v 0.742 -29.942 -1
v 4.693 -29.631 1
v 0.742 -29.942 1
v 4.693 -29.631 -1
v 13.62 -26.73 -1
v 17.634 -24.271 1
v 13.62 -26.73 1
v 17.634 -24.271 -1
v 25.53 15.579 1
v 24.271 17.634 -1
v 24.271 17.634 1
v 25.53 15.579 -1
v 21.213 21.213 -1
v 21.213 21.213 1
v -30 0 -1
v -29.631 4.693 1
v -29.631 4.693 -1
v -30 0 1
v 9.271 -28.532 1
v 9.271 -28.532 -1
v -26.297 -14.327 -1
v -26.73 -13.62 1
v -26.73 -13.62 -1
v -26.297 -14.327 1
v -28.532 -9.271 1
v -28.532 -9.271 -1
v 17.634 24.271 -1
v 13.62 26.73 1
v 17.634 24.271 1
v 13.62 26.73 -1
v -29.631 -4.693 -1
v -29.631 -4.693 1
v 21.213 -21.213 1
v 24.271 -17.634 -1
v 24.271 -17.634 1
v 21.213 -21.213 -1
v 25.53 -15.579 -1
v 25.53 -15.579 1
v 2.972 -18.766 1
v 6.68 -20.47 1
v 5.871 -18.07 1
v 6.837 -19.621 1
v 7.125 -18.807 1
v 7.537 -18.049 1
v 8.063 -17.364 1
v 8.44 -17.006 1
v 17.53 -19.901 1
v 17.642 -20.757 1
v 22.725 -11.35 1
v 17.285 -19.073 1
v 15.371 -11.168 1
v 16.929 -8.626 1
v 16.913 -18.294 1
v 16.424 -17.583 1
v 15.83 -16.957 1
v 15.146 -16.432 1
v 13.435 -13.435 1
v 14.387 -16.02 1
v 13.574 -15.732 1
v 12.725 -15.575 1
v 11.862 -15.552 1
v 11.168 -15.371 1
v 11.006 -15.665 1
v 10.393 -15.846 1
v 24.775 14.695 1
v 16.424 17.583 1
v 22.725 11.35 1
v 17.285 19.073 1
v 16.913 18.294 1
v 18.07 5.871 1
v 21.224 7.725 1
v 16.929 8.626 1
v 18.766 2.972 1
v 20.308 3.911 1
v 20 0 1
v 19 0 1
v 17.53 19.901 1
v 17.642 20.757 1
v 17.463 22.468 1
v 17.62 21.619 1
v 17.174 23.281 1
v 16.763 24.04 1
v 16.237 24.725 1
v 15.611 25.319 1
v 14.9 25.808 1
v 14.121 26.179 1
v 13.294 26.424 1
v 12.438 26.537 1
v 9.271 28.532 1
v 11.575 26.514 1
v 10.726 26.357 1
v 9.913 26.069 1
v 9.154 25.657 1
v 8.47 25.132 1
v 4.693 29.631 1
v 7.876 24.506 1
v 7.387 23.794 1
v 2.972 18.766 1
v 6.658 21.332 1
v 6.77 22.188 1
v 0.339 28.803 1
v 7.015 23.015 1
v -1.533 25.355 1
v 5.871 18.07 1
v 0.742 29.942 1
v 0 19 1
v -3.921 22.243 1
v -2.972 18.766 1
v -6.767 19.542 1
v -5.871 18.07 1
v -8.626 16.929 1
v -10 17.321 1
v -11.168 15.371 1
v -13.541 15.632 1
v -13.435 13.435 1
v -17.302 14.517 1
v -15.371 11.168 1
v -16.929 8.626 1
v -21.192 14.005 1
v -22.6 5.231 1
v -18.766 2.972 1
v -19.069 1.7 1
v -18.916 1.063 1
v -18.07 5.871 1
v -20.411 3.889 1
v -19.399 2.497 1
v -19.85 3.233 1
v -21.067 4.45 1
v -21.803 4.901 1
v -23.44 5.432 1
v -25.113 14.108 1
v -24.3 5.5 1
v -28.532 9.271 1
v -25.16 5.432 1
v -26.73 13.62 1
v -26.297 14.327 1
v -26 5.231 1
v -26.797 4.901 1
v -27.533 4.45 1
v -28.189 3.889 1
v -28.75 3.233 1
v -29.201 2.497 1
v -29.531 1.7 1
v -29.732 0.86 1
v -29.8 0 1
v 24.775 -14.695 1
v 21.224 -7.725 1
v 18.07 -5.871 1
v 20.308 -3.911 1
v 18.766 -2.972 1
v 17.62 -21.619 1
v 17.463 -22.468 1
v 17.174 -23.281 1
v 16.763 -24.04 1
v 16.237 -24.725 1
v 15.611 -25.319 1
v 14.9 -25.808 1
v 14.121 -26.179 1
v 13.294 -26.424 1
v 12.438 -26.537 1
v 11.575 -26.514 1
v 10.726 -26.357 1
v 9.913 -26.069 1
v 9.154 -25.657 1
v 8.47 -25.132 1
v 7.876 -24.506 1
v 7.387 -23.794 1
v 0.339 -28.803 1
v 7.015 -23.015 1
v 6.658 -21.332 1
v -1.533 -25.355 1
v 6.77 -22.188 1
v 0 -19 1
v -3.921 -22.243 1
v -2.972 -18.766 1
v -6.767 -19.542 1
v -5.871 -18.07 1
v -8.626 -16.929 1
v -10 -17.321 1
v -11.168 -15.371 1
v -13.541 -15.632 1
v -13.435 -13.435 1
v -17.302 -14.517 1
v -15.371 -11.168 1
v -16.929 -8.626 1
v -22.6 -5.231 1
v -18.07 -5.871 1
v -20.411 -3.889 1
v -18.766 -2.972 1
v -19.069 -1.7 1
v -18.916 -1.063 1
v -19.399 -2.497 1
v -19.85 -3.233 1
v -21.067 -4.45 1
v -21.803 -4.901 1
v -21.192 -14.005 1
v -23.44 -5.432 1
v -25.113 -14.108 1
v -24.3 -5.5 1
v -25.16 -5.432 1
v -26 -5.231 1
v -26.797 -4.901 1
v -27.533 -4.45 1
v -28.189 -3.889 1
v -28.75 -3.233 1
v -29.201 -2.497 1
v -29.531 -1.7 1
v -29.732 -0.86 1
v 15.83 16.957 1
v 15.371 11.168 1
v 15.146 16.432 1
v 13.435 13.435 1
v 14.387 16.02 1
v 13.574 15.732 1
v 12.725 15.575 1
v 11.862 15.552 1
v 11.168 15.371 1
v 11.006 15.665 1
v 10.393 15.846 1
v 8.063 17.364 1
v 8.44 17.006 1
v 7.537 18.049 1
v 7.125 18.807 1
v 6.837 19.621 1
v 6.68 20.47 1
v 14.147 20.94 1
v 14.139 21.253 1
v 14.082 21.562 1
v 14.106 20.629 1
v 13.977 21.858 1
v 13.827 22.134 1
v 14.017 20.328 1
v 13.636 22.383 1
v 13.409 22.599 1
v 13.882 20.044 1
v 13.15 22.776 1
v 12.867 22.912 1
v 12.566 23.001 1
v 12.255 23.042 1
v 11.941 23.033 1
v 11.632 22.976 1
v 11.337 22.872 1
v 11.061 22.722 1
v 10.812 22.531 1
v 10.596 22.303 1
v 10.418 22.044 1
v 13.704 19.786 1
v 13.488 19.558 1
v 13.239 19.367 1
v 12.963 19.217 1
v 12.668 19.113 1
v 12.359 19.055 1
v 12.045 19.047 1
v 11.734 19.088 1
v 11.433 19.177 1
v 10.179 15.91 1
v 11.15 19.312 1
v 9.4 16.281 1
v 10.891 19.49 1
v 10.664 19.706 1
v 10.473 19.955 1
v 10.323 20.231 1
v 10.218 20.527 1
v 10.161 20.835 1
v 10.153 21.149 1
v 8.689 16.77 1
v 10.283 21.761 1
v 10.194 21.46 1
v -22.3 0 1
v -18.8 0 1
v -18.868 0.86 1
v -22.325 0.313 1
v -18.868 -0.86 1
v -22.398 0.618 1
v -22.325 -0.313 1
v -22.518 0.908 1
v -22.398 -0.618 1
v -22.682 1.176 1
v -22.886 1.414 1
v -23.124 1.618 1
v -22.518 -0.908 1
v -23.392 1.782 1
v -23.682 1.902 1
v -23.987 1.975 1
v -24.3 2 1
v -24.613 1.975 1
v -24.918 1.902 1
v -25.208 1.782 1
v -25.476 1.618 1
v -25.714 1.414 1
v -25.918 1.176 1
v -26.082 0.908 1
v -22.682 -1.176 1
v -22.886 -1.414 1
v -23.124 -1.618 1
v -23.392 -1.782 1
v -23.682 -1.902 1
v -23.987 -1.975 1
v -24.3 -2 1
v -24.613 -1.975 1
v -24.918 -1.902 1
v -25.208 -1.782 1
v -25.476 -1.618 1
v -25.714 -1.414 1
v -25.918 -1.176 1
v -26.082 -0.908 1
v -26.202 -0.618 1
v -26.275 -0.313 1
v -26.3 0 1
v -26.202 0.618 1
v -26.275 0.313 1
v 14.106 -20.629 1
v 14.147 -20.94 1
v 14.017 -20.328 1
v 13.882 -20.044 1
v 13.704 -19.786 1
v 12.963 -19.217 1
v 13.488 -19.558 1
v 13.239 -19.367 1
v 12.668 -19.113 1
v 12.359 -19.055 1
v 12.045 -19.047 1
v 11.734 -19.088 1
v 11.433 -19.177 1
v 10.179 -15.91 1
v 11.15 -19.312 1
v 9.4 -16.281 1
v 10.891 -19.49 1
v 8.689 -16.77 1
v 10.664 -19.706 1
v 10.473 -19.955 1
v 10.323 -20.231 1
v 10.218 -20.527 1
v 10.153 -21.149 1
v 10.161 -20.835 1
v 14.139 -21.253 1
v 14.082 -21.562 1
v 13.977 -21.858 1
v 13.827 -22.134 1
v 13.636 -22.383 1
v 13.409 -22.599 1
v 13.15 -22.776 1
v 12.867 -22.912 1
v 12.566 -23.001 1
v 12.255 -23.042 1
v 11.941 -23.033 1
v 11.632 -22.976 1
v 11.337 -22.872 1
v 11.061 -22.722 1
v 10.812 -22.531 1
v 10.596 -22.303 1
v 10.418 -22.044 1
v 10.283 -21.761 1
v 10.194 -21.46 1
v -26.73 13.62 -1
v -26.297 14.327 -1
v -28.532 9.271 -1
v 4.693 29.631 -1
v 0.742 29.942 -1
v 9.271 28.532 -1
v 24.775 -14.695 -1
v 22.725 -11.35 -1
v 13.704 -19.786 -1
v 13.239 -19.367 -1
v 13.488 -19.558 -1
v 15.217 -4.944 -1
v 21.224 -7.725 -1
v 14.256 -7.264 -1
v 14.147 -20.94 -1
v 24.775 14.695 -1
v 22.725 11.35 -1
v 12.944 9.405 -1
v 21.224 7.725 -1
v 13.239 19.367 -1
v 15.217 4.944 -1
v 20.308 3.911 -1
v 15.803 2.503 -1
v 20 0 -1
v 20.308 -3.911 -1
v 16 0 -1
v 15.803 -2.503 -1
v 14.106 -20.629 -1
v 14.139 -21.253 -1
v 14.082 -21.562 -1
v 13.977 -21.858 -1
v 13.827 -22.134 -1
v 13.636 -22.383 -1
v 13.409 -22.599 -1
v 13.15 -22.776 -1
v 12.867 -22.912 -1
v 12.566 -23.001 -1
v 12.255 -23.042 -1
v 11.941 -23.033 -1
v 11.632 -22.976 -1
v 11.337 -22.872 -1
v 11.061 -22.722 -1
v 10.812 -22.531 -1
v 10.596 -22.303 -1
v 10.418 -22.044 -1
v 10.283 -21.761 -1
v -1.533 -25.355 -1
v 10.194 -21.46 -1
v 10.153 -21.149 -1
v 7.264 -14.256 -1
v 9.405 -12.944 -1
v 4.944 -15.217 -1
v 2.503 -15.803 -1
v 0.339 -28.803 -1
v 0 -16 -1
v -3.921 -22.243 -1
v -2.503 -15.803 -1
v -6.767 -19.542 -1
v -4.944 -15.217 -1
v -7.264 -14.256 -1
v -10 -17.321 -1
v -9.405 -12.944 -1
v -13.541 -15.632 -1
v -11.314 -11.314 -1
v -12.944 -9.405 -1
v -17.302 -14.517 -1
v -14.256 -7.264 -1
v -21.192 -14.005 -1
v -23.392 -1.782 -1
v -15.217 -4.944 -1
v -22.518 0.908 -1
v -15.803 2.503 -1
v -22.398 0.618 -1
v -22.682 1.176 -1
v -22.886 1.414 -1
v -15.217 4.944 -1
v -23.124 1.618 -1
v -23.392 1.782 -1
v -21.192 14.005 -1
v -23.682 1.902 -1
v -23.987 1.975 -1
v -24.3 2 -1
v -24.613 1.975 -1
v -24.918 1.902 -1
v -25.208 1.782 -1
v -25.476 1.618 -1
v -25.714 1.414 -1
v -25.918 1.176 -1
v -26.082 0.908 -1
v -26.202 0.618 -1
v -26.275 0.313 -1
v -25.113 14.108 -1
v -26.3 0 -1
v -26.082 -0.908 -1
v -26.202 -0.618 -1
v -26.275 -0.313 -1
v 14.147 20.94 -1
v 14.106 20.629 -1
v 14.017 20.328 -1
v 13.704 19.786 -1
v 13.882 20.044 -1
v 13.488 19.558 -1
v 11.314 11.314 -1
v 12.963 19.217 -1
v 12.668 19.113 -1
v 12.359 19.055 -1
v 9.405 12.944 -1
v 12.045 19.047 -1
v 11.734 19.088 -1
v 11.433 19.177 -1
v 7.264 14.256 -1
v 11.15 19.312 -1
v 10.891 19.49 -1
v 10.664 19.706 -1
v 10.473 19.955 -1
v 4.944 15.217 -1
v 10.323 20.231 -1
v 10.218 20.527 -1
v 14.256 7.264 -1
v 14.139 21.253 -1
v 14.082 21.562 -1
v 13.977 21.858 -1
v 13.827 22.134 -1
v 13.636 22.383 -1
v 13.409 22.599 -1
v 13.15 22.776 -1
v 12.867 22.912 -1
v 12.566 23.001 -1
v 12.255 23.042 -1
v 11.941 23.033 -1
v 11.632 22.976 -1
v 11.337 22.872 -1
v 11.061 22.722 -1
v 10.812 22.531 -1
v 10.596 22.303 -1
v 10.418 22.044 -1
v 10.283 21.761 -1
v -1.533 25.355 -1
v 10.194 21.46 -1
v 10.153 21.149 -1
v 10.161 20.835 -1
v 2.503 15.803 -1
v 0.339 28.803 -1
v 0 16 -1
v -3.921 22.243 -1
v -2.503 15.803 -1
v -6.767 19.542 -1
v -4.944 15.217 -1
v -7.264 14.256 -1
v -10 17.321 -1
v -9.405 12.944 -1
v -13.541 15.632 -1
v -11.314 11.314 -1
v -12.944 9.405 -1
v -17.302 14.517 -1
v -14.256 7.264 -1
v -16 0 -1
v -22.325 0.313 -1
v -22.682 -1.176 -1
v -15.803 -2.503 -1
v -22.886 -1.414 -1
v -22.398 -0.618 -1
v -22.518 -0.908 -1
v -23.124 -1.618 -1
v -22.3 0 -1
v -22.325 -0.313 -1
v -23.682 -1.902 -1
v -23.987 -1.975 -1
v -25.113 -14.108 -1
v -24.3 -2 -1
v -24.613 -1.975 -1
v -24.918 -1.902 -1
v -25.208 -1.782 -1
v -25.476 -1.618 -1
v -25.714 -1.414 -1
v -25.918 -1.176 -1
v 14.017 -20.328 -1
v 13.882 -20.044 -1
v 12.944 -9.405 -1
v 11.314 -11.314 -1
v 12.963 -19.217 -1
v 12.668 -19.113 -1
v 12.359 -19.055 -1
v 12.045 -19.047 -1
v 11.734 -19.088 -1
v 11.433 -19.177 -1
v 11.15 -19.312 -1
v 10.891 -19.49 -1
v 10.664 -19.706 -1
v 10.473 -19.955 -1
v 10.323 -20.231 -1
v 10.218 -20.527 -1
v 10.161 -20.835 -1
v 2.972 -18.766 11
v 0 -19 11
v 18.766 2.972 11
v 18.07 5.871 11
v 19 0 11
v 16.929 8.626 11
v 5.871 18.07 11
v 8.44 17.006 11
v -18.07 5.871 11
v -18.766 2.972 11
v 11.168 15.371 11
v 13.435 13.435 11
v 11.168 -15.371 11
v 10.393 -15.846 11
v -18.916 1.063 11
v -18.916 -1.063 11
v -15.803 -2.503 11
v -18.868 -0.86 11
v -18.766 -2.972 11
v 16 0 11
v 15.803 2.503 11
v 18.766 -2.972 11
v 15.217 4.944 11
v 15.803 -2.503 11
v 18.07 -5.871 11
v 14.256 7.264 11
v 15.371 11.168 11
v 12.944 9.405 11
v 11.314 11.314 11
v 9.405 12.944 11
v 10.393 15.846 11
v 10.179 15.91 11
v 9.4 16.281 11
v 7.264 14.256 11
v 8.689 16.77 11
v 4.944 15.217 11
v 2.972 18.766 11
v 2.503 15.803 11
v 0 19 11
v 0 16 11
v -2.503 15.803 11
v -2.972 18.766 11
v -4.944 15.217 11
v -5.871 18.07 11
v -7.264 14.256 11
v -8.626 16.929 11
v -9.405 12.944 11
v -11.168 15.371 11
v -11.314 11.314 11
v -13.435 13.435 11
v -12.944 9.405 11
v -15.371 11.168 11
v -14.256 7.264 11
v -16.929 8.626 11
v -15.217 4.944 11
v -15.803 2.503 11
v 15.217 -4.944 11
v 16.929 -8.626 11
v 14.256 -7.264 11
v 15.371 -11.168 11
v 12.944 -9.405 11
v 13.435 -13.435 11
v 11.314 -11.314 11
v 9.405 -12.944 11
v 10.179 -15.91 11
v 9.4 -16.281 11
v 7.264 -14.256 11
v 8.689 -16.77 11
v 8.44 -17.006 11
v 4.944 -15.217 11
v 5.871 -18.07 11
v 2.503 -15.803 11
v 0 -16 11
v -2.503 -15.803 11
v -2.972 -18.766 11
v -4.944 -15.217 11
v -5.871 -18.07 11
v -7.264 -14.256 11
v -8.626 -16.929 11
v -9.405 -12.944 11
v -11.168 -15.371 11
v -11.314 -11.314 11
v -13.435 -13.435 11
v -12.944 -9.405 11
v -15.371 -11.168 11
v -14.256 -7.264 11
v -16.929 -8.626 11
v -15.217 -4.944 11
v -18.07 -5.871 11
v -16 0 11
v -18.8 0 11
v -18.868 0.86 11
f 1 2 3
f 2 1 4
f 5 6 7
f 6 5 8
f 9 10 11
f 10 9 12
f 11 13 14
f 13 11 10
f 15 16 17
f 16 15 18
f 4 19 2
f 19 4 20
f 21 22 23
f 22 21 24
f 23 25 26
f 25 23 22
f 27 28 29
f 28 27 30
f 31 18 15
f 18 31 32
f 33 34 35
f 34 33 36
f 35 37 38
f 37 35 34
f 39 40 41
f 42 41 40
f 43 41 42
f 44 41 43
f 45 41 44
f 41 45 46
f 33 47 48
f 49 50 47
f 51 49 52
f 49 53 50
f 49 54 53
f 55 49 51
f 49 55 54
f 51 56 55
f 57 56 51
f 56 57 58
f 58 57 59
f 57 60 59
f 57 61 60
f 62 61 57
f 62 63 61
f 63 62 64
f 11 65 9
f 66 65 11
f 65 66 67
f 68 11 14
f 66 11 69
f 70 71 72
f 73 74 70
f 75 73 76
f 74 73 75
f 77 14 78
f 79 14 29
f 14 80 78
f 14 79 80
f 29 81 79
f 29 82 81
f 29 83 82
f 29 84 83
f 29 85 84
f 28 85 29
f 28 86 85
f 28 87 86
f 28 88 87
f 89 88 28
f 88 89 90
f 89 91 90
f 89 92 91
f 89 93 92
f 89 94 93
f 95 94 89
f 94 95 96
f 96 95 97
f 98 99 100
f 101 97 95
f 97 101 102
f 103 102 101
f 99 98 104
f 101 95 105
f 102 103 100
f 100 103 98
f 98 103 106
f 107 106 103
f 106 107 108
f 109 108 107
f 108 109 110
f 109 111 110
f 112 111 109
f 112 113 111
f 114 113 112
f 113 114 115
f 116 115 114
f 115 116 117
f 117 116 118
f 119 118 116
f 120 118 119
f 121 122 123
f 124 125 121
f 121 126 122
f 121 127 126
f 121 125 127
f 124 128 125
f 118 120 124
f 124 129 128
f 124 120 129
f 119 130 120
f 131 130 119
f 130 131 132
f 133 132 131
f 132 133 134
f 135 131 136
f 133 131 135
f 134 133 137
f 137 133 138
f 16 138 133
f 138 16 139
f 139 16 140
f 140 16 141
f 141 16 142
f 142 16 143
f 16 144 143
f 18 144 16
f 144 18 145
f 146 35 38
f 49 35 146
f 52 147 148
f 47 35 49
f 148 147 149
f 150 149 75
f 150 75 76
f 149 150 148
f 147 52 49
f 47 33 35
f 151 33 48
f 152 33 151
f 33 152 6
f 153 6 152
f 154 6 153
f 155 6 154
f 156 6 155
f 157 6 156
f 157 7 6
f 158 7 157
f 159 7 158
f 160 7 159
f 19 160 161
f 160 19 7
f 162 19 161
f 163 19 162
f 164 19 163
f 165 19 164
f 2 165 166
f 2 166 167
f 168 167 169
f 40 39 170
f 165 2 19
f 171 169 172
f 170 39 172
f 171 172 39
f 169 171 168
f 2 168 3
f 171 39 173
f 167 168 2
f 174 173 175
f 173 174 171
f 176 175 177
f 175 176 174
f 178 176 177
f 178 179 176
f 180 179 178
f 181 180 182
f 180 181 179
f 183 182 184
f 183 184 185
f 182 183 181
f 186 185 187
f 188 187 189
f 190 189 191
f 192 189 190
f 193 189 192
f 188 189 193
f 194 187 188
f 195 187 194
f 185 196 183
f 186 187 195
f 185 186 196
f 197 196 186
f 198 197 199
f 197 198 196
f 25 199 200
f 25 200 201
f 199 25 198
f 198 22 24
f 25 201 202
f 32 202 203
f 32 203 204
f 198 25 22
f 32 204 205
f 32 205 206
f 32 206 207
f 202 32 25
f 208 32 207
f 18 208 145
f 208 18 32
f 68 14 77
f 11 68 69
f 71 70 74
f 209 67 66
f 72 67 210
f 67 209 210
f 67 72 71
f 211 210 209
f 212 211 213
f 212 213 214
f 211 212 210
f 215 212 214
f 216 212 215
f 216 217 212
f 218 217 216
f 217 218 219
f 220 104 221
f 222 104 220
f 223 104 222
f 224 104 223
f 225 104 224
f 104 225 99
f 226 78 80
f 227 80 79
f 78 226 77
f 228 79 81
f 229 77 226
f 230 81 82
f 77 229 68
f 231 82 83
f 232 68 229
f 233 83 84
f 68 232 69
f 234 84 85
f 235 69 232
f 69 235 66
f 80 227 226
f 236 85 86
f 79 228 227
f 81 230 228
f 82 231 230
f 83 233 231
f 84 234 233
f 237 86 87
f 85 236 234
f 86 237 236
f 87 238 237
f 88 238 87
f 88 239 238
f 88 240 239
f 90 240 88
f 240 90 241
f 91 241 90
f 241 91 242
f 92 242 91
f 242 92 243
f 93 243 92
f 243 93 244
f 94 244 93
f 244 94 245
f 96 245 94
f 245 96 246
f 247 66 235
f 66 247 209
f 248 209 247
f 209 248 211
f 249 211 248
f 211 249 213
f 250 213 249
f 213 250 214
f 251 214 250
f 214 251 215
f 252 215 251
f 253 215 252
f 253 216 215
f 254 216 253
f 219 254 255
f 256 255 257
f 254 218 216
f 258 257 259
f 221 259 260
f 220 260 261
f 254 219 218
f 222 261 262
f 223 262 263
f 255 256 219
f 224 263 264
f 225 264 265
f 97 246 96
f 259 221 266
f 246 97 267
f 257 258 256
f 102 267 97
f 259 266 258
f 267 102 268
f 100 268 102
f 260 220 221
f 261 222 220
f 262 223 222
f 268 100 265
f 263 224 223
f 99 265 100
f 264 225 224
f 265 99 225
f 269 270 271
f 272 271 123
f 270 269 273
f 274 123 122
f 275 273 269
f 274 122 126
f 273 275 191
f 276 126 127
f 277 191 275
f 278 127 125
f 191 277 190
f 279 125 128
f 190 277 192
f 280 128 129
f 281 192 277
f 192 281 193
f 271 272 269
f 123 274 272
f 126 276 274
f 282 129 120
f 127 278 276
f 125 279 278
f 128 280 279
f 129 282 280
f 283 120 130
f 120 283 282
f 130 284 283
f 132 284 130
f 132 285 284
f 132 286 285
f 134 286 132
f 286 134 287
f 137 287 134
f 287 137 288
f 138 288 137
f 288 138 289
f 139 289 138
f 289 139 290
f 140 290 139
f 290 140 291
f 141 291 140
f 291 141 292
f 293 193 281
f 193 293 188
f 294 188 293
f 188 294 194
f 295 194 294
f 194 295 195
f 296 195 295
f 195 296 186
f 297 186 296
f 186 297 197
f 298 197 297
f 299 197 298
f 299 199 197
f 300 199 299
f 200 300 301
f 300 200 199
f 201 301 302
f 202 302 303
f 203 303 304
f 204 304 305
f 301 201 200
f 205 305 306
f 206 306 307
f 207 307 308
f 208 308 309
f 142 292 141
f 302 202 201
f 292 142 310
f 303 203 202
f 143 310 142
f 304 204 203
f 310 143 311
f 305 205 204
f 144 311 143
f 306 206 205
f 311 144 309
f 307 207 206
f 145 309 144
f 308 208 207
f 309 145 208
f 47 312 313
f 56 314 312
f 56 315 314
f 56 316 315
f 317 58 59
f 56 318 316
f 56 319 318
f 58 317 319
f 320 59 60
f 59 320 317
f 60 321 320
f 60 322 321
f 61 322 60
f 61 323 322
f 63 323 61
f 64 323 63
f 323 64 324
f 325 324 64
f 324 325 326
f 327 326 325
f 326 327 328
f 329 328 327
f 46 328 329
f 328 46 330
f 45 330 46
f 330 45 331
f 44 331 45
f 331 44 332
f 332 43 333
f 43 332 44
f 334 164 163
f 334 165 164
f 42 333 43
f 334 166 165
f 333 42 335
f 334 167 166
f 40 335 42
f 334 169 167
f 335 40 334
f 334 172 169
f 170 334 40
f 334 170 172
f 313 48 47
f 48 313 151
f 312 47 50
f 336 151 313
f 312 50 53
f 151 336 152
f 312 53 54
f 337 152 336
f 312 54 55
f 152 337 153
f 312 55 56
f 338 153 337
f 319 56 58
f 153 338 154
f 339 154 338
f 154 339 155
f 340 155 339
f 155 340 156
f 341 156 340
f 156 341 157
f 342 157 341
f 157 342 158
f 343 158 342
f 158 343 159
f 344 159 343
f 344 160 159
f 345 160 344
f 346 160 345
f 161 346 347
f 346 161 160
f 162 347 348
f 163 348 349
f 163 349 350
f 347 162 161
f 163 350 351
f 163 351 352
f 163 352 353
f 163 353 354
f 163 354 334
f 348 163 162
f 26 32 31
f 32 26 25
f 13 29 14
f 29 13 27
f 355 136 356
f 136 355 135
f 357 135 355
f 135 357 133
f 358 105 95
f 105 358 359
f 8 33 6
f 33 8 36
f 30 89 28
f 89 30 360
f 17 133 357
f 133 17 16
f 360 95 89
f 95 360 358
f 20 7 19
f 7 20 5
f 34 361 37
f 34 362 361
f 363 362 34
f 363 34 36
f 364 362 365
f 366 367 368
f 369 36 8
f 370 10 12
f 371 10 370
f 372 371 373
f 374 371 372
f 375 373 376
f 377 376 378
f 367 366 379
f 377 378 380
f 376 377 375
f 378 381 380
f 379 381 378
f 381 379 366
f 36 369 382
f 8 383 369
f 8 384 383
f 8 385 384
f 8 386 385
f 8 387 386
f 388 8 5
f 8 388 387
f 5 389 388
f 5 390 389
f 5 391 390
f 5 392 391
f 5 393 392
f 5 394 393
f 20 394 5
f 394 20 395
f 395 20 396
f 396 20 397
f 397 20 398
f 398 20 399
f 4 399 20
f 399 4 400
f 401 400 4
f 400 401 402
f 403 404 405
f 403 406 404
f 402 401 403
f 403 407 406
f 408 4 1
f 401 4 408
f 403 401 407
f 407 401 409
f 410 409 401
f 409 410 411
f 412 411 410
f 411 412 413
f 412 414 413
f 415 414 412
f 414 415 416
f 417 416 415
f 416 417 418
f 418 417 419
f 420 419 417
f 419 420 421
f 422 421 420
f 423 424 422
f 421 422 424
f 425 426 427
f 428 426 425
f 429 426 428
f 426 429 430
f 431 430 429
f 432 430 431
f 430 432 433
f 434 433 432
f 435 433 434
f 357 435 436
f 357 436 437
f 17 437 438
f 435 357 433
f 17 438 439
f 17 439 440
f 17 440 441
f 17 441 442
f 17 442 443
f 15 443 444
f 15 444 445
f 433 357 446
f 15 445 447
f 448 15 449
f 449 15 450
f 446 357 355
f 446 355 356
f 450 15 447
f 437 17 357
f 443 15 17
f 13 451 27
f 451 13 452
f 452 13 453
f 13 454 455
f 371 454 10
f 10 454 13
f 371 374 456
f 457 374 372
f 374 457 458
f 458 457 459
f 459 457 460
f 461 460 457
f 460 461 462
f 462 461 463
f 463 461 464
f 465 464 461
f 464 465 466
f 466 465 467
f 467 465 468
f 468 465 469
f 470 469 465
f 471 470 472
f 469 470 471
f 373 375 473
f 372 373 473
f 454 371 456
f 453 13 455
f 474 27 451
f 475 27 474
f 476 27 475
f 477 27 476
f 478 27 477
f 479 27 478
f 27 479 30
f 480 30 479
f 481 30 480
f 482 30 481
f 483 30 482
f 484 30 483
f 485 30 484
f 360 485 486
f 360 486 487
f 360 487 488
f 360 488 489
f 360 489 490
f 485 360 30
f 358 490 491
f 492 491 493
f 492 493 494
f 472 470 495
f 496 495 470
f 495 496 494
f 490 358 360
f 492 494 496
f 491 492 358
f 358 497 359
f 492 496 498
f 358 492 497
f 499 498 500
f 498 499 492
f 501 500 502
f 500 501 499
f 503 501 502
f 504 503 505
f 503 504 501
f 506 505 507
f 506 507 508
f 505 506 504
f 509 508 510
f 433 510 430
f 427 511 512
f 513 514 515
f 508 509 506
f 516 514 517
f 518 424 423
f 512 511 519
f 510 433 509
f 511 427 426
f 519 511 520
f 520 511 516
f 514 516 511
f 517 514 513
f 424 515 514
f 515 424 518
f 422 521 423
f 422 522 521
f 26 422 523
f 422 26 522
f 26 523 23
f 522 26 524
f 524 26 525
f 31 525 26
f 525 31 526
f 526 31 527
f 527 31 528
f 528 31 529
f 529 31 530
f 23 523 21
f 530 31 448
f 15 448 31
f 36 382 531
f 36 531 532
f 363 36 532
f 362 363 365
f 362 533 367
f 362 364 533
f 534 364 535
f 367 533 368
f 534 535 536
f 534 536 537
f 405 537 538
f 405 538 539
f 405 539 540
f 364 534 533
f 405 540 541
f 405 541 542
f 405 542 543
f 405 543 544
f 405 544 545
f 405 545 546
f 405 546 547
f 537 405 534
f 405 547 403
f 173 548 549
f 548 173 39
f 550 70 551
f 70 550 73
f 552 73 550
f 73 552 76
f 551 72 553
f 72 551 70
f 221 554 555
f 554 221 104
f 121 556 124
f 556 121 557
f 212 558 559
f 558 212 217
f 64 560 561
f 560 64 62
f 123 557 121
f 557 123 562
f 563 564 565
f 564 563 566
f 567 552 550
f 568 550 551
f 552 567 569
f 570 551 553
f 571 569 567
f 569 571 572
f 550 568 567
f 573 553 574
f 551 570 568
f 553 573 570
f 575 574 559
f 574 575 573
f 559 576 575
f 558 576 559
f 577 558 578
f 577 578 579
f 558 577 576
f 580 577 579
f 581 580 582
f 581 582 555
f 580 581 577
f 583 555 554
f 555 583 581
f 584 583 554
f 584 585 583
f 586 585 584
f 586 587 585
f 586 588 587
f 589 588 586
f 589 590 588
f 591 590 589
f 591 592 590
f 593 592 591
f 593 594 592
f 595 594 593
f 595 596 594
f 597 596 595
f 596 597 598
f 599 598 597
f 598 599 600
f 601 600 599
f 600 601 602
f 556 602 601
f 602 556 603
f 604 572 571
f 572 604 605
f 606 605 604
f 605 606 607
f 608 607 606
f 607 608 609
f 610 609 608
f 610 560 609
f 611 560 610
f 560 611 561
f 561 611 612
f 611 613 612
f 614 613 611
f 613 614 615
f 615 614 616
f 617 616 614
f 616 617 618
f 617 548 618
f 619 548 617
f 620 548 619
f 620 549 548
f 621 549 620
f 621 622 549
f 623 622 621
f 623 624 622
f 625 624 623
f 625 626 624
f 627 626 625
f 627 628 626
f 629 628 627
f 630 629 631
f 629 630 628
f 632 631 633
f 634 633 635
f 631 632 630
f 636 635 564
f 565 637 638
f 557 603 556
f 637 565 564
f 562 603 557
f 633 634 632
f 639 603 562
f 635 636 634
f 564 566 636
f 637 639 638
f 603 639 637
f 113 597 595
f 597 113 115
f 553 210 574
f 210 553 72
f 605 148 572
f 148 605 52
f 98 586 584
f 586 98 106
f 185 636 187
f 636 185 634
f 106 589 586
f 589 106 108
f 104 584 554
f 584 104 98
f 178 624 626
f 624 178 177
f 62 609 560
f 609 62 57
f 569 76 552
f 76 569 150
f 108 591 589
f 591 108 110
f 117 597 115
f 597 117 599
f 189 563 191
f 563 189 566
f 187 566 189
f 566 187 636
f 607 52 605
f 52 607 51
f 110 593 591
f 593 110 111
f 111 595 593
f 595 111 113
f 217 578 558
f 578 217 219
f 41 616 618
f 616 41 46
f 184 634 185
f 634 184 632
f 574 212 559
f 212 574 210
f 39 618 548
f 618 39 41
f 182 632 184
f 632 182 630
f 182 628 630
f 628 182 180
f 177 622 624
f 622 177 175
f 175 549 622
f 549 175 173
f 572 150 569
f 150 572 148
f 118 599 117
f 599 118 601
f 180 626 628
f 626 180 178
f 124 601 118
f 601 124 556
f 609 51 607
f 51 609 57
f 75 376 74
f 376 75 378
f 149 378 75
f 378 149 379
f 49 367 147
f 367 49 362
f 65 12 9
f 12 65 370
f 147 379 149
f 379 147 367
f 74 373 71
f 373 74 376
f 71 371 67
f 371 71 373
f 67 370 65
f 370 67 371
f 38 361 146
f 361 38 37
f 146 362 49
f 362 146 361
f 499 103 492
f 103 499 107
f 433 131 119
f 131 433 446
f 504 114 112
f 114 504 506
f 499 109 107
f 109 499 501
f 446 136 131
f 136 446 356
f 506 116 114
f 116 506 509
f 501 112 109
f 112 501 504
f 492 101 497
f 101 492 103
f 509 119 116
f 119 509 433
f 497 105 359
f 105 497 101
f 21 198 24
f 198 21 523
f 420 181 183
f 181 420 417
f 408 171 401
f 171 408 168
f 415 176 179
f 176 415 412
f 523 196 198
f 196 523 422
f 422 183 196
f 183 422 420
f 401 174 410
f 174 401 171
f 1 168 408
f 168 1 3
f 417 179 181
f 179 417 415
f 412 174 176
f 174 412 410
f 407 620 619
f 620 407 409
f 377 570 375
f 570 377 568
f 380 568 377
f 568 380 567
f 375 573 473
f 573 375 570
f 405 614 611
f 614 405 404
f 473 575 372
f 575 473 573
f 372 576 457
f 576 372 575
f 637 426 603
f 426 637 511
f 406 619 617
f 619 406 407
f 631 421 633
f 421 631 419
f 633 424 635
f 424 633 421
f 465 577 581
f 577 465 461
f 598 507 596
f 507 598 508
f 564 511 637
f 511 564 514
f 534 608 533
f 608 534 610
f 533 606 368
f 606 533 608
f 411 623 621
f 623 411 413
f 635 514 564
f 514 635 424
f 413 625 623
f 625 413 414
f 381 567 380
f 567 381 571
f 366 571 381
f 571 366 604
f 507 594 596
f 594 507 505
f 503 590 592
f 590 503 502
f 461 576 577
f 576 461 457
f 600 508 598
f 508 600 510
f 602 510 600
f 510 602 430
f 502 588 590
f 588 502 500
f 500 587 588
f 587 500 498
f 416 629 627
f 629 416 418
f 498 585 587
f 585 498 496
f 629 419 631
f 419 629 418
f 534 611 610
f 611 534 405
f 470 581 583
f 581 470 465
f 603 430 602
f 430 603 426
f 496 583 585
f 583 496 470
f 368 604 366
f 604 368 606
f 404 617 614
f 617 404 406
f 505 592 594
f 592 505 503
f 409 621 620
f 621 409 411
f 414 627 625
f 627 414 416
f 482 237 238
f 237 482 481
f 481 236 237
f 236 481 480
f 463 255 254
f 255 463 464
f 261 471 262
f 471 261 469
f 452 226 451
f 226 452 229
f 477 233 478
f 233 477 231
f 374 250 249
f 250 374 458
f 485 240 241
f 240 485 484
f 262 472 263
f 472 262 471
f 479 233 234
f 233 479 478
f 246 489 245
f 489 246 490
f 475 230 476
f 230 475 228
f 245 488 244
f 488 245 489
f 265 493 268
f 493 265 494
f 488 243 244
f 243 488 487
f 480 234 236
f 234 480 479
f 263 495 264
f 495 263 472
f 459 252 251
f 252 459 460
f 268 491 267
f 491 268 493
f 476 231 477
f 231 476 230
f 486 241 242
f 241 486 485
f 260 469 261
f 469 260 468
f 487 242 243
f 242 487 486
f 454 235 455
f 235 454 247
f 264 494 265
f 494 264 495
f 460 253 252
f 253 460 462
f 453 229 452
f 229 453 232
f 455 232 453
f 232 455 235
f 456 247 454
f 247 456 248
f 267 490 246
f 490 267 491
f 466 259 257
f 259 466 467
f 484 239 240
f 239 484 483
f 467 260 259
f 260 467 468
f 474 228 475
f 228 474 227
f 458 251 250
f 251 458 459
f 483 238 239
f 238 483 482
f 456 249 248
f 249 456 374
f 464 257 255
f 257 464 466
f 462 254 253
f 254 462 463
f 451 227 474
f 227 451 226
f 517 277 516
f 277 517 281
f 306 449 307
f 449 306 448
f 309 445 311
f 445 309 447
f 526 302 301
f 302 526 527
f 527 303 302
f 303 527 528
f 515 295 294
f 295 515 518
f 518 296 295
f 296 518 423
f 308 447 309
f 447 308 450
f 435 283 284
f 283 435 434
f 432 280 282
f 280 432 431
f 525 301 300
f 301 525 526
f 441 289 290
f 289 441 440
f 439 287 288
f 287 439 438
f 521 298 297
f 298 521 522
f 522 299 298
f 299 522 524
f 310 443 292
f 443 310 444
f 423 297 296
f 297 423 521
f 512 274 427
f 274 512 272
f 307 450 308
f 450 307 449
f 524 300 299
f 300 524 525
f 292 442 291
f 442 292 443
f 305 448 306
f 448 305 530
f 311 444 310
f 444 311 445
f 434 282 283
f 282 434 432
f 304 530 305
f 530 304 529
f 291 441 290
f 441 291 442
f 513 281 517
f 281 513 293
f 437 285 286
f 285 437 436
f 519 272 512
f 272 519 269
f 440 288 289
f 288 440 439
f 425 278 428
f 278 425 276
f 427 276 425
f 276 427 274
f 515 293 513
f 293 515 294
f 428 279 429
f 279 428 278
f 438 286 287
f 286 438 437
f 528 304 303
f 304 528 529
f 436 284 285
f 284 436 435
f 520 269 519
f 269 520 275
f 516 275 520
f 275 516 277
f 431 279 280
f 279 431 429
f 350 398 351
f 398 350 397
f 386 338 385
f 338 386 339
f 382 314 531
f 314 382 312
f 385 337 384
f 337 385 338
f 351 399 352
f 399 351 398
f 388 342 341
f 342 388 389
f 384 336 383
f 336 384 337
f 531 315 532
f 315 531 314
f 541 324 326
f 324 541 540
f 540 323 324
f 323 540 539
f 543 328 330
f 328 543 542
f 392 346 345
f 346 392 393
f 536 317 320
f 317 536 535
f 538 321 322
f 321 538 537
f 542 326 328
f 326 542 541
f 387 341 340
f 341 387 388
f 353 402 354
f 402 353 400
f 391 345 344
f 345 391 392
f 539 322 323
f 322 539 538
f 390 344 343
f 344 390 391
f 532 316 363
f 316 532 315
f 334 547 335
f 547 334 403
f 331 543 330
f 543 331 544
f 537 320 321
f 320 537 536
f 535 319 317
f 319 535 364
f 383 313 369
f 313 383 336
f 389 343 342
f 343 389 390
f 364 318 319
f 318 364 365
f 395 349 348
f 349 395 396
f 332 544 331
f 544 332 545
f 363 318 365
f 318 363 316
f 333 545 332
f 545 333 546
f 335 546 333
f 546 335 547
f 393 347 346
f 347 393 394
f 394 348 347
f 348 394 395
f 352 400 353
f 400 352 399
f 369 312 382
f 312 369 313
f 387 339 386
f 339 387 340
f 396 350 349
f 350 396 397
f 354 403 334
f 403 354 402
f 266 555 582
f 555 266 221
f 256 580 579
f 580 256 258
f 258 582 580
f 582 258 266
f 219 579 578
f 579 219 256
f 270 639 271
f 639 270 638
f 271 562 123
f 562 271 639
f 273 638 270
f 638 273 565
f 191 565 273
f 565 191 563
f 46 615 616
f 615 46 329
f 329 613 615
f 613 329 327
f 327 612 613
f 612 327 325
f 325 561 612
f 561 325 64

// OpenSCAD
// Units are in mm.

// The overall size of the hub flange.
flange_diameter = 60;
// The size of the PVC pipe going through the hub.  This is tHe perfect size for 3/4" PVC.  It will bend a little and your bushings may be a little loose so there is no need to add tolerance here unless your PVC is actually a different size.  Measure it.  It will fail if you don't have it just right.
pvc_diameter = 26.6;    
// The size of the hole in the center of the hub.  It must be larger than the rod going through it.
center_hole_diameter = 32;    
// The size of the bushing.  This should be the EXACT size of the hole in your spool. The default should fit spools from MonoPrice.com
bushing_diameter = 38;
// The size of your bearing.  This is the correct value for a 608 skate bearing.
bearing_diameter = 22;
// The inner diameter of your bearing.  This is the correct value for a #6 screw which is what I use.  For a 608 bearing, 8 is the maximum.
bearing_screw_diameter = 4;
// The diameter of the head or washer of your bearing screw. Give yourself a little extra room.
bearing_screw_head_diameter = 11;
// Indicates whether to apply cutouts to save material when printing.  
use_cutouts = 1; // [0:No,1:Yes]
// The thickness of the flange.
thickness = 2;
// The length of the bushing; how far it extends into the spool.
bushing_height = 12;
//bushing_height = 1;
//bushing_height = thickness * 3;
// If the cutouts cut too far into the center, use this to move the cutouts.
cutout_position_offset = 15;
// If the cutouts are too small, use this to enlarge them.  Adjusting the cutouts allows you to minimize printing material.
cutout_size_offset = 10;

// Higher resolution rendering for cleaner holes.  40 is good.
$fn = 40;


bushing_thickness = bushing_diameter - pvc_diameter;
// Something wrong with OpenSCAD.NET.  Assigning a variable to itself or roundtrip will give it a strange value and breaks things.
//c = (bushing_height == 1) ? thickness * 3 : bushing_height;
//c = bushing_height ;
//bushing_height = c;

function bearing_screw_offset() = pvc_diameter/2 + bearing_diameter/2;
function bearing_screw_head_clearance_hole_height() = bushing_height;
function bearing_screw_head_clearance_hole_zoffset() = bearing_screw_head_clearance_hole_height() + thickness / 2;


difference () {
    union() {
        // Plate
        cylinder(r = flange_diameter/2, h = thickness, center = true);
        // Spool bushing
//        translate ([0, 0, (bushing_height - thickness) / 2]) cylinder(r = pvc_diameter/2 + bushing_thickness, h = bushing_height, center = true);
        translate ([0, 0, (bushing_height - thickness) / 2]) cylinder(r = (pvc_diameter + bushing_thickness) / 2, h = bushing_height, center = true);
    }      
    // Hub inner hole
    //cylinder(r = pvc_diameter/2, h = bushing_height * 10, center = true);
    cylinder(r = center_hole_diameter/2, h = bushing_height * 10, center = true);

    // Larger cutouts, for saving material (optional).
    if (use_cutouts) {
        rotate ([0, 0, 0]) translate ([flange_diameter/2 + cutout_position_offset, 0, 0]) cylinder(r = flange_diameter/4 + cutout_size_offset, h = thickness * 100 + 2, center = true);
        rotate ([0, 0, 120]) translate ([flange_diameter/2 + cutout_position_offset, 0, 0]) cylinder(r = flange_diameter/4 + cutout_size_offset, h = thickness * 100 + 2, center = true);
        rotate ([0, 0, 240]) translate ([flange_diameter/2 + cutout_position_offset, 0, 0]) cylinder(r = flange_diameter/4 + cutout_size_offset, h = thickness * 100 + 2, center = true);
    }
    // Smaller holes, for bearing screws.
    rotate([0, 0, 60+0]) translate ([pvc_diameter/2 + bearing_diameter/2, 0, 0]) cylinder(r = bearing_screw_diameter/2, h = thickness + 2, center = true);
    rotate([0, 0, 60+120]) translate ([pvc_diameter/2 + bearing_diameter/2, 0, 0]) cylinder(r = bearing_screw_diameter/2, h = thickness + 2, center = true);
    rotate([0, 0, 60+240]) translate ([pvc_diameter/2 + bearing_diameter/2, 0, 0]) cylinder(r = bearing_screw_diameter/2, h = thickness + 2, center = true);


    // Holes for clearing bearing screw heads.
//    rotate([0, 0, 60+0]) translate ([pvc_diameter/2 + bearing_diameter/2, 0, (thickness + 2) * 10 / 2 + thickness / 2]) cylinder(r = bearing_screw_head_diameter/2, h = (thickness + 2) * 10, center = true);
//    rotate([0, 0, 60+120]) translate ([pvc_diameter/2 + bearing_diameter/2, 0, thickness * 2]) cylinder(r = bearing_screw_head_diameter/2, h = (thickness + 2) * 10, center = true);
//    rotate([0, 0, 60+240]) translate ([pvc_diameter/2 + bearing_diameter/2, 0, thickness * 4]) cylinder(r = bearing_screw_head_diameter/2, h = (thickness + 2) * 10, center = true);

    rotate([0, 0, 60+0]) translate ([bearing_screw_offset(), 0,bearing_screw_head_clearance_hole_zoffset()]) cylinder(r = bearing_screw_head_diameter/2, h = bearing_screw_head_clearance_hole_height() * 2, center = true);
    rotate([0, 0, 60+120]) translate ([bearing_screw_offset(), 0, bearing_screw_head_clearance_hole_zoffset()]) cylinder(r = bearing_screw_head_diameter/2, h = bearing_screw_head_clearance_hole_height() * 2, center = true);
    rotate([0, 0, 60+240]) translate ([bearing_screw_offset(), 0, bearing_screw_head_clearance_hole_zoffset()]) cylinder(r = bearing_screw_head_diameter/2, h = bearing_screw_head_clearance_hole_height() * 2, center = true);

}
